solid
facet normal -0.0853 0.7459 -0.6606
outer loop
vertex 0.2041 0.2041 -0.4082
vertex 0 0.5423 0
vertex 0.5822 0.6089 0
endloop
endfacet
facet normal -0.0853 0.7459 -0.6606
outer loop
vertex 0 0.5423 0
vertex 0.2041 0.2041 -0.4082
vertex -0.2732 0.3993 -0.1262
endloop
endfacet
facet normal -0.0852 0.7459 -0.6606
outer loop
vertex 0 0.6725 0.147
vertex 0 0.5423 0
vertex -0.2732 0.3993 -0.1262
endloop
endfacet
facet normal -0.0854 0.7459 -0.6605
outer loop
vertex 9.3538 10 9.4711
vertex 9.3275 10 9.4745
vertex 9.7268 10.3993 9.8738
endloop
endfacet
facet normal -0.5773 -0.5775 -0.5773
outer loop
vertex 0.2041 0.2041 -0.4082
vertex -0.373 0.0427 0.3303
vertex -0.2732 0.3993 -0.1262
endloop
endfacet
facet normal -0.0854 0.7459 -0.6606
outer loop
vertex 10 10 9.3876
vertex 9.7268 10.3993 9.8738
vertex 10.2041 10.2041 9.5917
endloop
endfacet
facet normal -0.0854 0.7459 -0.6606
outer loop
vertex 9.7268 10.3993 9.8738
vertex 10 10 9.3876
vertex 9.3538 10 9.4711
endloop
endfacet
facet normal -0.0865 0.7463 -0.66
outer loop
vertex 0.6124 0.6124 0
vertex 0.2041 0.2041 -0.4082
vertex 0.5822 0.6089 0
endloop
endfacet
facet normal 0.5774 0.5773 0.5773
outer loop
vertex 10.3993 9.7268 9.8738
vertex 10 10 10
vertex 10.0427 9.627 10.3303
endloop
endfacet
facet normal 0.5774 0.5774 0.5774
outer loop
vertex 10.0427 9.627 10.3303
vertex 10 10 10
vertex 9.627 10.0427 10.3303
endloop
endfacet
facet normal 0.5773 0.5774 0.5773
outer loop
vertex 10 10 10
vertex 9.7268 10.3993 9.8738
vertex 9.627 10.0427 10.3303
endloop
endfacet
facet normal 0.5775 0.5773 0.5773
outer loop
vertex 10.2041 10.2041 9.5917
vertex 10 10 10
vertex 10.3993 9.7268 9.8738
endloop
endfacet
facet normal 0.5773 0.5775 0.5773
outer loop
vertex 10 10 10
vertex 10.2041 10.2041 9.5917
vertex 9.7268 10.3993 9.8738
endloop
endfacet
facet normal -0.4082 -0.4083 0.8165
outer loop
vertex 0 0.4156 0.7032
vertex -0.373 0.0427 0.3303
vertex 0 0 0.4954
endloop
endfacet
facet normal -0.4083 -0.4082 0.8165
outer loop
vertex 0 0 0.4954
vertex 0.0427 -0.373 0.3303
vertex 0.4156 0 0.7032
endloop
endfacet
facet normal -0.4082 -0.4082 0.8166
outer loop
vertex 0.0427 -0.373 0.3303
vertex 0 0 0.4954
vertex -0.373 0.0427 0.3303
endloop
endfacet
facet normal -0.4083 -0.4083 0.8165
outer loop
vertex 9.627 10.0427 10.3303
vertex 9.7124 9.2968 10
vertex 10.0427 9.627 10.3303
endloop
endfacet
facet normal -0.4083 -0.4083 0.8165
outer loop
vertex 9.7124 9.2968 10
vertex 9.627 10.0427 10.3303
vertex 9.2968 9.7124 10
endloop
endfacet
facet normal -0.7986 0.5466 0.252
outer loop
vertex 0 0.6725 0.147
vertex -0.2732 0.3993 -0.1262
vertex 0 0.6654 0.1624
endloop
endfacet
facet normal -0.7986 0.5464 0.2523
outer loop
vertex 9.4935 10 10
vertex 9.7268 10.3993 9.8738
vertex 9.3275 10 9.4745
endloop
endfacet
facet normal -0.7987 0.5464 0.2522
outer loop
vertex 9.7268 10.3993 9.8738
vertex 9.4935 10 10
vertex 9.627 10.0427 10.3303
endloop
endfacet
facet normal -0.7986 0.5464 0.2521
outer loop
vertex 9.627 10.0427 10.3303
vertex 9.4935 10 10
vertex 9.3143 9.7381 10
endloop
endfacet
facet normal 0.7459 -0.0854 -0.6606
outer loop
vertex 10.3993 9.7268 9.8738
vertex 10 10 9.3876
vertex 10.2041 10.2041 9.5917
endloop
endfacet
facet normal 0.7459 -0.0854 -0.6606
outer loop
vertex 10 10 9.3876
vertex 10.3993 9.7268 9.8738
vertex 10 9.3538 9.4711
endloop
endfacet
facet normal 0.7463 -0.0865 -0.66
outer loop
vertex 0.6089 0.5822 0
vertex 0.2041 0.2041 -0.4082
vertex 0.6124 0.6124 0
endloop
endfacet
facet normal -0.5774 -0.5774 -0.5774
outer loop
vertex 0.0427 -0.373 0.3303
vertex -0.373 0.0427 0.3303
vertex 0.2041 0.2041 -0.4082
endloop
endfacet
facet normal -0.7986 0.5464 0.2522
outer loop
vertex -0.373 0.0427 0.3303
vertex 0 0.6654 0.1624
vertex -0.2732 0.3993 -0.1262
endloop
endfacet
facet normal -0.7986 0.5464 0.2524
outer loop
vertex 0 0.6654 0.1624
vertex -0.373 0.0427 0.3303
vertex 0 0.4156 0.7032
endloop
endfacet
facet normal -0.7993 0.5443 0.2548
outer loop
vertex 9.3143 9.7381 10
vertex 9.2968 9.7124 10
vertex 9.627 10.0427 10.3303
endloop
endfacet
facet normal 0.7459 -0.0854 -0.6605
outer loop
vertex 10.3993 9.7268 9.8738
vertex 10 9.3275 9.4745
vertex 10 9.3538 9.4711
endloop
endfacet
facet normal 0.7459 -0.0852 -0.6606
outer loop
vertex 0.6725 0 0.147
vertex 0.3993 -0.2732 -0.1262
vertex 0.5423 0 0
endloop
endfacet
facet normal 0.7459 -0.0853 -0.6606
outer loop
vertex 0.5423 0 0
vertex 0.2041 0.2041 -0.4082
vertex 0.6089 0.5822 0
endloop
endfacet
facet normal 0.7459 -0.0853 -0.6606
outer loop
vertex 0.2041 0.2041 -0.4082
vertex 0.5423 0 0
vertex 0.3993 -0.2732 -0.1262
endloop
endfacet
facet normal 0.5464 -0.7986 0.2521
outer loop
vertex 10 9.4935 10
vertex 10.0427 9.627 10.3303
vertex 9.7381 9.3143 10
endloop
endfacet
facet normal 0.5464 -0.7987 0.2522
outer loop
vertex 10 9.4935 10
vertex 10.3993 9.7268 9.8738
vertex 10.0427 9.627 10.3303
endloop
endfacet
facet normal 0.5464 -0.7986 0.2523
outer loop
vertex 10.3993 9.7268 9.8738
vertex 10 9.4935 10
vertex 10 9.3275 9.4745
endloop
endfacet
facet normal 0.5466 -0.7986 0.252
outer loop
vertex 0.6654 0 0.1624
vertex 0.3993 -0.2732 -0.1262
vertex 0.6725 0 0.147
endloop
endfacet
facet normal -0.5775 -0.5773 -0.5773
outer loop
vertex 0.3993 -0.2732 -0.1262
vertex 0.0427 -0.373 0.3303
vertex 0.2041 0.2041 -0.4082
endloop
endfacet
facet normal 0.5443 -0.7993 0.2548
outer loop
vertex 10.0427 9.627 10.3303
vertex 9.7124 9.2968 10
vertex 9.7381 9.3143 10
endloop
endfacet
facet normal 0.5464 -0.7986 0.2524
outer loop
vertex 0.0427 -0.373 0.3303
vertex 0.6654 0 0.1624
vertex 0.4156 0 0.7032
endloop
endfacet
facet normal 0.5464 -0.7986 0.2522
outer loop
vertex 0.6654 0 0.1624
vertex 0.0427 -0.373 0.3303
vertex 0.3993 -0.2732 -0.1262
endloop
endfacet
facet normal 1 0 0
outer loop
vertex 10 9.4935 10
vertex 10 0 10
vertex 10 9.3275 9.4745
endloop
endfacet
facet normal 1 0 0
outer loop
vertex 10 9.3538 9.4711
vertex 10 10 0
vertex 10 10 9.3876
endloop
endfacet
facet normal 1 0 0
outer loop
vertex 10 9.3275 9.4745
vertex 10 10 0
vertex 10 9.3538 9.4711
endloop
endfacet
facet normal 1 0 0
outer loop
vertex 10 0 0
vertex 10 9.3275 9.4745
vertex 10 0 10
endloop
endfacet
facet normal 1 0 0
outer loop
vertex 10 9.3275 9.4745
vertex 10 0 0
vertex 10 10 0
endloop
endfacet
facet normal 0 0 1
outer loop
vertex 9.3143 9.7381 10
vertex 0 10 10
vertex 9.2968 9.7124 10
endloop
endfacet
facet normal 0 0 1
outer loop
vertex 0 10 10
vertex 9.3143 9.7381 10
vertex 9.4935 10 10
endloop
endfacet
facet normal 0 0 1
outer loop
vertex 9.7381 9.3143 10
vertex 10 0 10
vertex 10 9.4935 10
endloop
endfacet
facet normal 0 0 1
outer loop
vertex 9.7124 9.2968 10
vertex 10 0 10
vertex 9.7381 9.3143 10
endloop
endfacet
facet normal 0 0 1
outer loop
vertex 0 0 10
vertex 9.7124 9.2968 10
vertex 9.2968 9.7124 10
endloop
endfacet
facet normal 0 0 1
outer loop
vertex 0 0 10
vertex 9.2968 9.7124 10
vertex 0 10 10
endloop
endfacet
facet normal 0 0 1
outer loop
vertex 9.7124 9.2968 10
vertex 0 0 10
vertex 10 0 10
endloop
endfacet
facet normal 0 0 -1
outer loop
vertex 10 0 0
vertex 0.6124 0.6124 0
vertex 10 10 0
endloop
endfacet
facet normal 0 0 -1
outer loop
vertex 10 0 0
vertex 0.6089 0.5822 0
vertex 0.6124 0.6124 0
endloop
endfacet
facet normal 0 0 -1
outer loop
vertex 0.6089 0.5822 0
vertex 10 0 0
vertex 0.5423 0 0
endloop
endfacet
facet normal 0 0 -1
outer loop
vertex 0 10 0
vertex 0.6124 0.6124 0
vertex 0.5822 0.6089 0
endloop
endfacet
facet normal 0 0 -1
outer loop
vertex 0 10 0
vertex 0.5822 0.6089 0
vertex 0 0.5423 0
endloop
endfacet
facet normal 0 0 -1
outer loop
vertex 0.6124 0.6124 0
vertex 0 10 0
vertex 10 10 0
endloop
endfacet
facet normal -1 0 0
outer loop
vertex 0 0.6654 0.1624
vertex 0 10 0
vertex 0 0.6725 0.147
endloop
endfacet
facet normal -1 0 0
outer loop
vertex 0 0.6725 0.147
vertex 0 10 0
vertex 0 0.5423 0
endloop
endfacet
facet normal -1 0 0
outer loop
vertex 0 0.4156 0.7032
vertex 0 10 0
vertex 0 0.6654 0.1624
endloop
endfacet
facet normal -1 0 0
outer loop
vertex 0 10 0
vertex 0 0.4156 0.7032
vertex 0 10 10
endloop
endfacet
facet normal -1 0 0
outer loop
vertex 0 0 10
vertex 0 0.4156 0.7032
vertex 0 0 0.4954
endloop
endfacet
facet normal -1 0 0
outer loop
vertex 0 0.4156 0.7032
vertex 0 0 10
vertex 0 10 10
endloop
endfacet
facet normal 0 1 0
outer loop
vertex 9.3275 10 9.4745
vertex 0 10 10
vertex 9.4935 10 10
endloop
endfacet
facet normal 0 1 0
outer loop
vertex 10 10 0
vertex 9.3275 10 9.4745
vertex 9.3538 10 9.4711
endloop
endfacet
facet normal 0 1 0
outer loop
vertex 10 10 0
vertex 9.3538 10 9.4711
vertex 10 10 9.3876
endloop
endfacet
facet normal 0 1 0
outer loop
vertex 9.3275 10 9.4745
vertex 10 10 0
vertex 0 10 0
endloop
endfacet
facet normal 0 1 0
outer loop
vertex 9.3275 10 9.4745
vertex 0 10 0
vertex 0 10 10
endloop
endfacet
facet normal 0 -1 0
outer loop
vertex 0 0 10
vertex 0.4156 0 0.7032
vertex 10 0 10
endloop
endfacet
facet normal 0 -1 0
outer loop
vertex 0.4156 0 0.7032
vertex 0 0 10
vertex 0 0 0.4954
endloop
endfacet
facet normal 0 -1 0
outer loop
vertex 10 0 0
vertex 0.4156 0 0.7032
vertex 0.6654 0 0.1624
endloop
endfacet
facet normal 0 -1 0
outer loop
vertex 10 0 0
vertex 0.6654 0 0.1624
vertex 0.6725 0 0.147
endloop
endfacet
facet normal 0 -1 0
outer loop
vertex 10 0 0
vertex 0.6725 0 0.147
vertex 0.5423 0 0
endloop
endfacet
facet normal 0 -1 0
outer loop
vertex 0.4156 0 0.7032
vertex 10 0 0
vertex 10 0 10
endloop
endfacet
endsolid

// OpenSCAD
// Unit of length: Unit.MM
union()
{
   rotate(a = [0.0, 54.7356, 45.0])
   {
      cylinder(h = 17.3205, d = 1.0, center = false);
   }
   color(c = [0.502, 0.502, 0.502, 0.5])
   {
      cube(size = 10.0, center = false);
   }
}
